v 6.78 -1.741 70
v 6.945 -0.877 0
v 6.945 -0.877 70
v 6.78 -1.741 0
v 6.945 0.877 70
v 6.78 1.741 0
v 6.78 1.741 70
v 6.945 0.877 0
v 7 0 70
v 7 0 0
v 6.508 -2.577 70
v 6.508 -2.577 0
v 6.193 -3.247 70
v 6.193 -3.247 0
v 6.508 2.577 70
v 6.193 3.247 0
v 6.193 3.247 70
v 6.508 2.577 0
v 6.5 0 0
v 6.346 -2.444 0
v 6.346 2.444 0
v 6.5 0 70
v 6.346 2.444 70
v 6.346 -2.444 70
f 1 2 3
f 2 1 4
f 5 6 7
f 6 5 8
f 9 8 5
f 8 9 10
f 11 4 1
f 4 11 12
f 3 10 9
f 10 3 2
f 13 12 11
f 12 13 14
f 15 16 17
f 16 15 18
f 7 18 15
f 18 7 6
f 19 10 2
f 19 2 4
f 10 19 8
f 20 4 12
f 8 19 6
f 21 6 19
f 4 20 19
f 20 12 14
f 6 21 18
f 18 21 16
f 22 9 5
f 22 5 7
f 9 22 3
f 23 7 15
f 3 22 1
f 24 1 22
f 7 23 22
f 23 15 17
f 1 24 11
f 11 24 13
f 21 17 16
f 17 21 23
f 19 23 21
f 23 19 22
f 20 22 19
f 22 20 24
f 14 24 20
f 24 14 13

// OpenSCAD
$fn = 50;


difference() {
	union() {
		cylinder(h = 70, r = 7.0000000000);
		translate(v = [-16.0000000000, 0, 0]) {
			cylinder(h = 70, r = 7.0000000000);
		}
	}
	union() {
		cylinder(h = 70, r = 3.2500000000);
		cylinder(h = 70, r = 1.8000000000);
		cylinder(h = 70, r = 1.8000000000);
		cylinder(h = 70, r = 1.8000000000);
		translate(v = [-20.5000000000, 0, 0]) {
			hull() {
				translate(v = [-3.7500000000, 0.0000000000, 0]) {
					cylinder(h = 70, r = 10.5000000000);
				}
				translate(v = [3.7500000000, 0.0000000000, 0]) {
					cylinder(h = 70, r = 10.5000000000);
				}
				translate(v = [-3.7500000000, -0.0000000000, 0]) {
					cylinder(h = 70, r = 10.5000000000);
				}
				translate(v = [3.7500000000, -0.0000000000, 0]) {
					cylinder(h = 70, r = 10.5000000000);
				}
			}
		}
		translate(v = [-13.0000000000, 0, 0.0000000000]) {
			cylinder(h = 70, r = 19.5000000000);
		}
	}
}
